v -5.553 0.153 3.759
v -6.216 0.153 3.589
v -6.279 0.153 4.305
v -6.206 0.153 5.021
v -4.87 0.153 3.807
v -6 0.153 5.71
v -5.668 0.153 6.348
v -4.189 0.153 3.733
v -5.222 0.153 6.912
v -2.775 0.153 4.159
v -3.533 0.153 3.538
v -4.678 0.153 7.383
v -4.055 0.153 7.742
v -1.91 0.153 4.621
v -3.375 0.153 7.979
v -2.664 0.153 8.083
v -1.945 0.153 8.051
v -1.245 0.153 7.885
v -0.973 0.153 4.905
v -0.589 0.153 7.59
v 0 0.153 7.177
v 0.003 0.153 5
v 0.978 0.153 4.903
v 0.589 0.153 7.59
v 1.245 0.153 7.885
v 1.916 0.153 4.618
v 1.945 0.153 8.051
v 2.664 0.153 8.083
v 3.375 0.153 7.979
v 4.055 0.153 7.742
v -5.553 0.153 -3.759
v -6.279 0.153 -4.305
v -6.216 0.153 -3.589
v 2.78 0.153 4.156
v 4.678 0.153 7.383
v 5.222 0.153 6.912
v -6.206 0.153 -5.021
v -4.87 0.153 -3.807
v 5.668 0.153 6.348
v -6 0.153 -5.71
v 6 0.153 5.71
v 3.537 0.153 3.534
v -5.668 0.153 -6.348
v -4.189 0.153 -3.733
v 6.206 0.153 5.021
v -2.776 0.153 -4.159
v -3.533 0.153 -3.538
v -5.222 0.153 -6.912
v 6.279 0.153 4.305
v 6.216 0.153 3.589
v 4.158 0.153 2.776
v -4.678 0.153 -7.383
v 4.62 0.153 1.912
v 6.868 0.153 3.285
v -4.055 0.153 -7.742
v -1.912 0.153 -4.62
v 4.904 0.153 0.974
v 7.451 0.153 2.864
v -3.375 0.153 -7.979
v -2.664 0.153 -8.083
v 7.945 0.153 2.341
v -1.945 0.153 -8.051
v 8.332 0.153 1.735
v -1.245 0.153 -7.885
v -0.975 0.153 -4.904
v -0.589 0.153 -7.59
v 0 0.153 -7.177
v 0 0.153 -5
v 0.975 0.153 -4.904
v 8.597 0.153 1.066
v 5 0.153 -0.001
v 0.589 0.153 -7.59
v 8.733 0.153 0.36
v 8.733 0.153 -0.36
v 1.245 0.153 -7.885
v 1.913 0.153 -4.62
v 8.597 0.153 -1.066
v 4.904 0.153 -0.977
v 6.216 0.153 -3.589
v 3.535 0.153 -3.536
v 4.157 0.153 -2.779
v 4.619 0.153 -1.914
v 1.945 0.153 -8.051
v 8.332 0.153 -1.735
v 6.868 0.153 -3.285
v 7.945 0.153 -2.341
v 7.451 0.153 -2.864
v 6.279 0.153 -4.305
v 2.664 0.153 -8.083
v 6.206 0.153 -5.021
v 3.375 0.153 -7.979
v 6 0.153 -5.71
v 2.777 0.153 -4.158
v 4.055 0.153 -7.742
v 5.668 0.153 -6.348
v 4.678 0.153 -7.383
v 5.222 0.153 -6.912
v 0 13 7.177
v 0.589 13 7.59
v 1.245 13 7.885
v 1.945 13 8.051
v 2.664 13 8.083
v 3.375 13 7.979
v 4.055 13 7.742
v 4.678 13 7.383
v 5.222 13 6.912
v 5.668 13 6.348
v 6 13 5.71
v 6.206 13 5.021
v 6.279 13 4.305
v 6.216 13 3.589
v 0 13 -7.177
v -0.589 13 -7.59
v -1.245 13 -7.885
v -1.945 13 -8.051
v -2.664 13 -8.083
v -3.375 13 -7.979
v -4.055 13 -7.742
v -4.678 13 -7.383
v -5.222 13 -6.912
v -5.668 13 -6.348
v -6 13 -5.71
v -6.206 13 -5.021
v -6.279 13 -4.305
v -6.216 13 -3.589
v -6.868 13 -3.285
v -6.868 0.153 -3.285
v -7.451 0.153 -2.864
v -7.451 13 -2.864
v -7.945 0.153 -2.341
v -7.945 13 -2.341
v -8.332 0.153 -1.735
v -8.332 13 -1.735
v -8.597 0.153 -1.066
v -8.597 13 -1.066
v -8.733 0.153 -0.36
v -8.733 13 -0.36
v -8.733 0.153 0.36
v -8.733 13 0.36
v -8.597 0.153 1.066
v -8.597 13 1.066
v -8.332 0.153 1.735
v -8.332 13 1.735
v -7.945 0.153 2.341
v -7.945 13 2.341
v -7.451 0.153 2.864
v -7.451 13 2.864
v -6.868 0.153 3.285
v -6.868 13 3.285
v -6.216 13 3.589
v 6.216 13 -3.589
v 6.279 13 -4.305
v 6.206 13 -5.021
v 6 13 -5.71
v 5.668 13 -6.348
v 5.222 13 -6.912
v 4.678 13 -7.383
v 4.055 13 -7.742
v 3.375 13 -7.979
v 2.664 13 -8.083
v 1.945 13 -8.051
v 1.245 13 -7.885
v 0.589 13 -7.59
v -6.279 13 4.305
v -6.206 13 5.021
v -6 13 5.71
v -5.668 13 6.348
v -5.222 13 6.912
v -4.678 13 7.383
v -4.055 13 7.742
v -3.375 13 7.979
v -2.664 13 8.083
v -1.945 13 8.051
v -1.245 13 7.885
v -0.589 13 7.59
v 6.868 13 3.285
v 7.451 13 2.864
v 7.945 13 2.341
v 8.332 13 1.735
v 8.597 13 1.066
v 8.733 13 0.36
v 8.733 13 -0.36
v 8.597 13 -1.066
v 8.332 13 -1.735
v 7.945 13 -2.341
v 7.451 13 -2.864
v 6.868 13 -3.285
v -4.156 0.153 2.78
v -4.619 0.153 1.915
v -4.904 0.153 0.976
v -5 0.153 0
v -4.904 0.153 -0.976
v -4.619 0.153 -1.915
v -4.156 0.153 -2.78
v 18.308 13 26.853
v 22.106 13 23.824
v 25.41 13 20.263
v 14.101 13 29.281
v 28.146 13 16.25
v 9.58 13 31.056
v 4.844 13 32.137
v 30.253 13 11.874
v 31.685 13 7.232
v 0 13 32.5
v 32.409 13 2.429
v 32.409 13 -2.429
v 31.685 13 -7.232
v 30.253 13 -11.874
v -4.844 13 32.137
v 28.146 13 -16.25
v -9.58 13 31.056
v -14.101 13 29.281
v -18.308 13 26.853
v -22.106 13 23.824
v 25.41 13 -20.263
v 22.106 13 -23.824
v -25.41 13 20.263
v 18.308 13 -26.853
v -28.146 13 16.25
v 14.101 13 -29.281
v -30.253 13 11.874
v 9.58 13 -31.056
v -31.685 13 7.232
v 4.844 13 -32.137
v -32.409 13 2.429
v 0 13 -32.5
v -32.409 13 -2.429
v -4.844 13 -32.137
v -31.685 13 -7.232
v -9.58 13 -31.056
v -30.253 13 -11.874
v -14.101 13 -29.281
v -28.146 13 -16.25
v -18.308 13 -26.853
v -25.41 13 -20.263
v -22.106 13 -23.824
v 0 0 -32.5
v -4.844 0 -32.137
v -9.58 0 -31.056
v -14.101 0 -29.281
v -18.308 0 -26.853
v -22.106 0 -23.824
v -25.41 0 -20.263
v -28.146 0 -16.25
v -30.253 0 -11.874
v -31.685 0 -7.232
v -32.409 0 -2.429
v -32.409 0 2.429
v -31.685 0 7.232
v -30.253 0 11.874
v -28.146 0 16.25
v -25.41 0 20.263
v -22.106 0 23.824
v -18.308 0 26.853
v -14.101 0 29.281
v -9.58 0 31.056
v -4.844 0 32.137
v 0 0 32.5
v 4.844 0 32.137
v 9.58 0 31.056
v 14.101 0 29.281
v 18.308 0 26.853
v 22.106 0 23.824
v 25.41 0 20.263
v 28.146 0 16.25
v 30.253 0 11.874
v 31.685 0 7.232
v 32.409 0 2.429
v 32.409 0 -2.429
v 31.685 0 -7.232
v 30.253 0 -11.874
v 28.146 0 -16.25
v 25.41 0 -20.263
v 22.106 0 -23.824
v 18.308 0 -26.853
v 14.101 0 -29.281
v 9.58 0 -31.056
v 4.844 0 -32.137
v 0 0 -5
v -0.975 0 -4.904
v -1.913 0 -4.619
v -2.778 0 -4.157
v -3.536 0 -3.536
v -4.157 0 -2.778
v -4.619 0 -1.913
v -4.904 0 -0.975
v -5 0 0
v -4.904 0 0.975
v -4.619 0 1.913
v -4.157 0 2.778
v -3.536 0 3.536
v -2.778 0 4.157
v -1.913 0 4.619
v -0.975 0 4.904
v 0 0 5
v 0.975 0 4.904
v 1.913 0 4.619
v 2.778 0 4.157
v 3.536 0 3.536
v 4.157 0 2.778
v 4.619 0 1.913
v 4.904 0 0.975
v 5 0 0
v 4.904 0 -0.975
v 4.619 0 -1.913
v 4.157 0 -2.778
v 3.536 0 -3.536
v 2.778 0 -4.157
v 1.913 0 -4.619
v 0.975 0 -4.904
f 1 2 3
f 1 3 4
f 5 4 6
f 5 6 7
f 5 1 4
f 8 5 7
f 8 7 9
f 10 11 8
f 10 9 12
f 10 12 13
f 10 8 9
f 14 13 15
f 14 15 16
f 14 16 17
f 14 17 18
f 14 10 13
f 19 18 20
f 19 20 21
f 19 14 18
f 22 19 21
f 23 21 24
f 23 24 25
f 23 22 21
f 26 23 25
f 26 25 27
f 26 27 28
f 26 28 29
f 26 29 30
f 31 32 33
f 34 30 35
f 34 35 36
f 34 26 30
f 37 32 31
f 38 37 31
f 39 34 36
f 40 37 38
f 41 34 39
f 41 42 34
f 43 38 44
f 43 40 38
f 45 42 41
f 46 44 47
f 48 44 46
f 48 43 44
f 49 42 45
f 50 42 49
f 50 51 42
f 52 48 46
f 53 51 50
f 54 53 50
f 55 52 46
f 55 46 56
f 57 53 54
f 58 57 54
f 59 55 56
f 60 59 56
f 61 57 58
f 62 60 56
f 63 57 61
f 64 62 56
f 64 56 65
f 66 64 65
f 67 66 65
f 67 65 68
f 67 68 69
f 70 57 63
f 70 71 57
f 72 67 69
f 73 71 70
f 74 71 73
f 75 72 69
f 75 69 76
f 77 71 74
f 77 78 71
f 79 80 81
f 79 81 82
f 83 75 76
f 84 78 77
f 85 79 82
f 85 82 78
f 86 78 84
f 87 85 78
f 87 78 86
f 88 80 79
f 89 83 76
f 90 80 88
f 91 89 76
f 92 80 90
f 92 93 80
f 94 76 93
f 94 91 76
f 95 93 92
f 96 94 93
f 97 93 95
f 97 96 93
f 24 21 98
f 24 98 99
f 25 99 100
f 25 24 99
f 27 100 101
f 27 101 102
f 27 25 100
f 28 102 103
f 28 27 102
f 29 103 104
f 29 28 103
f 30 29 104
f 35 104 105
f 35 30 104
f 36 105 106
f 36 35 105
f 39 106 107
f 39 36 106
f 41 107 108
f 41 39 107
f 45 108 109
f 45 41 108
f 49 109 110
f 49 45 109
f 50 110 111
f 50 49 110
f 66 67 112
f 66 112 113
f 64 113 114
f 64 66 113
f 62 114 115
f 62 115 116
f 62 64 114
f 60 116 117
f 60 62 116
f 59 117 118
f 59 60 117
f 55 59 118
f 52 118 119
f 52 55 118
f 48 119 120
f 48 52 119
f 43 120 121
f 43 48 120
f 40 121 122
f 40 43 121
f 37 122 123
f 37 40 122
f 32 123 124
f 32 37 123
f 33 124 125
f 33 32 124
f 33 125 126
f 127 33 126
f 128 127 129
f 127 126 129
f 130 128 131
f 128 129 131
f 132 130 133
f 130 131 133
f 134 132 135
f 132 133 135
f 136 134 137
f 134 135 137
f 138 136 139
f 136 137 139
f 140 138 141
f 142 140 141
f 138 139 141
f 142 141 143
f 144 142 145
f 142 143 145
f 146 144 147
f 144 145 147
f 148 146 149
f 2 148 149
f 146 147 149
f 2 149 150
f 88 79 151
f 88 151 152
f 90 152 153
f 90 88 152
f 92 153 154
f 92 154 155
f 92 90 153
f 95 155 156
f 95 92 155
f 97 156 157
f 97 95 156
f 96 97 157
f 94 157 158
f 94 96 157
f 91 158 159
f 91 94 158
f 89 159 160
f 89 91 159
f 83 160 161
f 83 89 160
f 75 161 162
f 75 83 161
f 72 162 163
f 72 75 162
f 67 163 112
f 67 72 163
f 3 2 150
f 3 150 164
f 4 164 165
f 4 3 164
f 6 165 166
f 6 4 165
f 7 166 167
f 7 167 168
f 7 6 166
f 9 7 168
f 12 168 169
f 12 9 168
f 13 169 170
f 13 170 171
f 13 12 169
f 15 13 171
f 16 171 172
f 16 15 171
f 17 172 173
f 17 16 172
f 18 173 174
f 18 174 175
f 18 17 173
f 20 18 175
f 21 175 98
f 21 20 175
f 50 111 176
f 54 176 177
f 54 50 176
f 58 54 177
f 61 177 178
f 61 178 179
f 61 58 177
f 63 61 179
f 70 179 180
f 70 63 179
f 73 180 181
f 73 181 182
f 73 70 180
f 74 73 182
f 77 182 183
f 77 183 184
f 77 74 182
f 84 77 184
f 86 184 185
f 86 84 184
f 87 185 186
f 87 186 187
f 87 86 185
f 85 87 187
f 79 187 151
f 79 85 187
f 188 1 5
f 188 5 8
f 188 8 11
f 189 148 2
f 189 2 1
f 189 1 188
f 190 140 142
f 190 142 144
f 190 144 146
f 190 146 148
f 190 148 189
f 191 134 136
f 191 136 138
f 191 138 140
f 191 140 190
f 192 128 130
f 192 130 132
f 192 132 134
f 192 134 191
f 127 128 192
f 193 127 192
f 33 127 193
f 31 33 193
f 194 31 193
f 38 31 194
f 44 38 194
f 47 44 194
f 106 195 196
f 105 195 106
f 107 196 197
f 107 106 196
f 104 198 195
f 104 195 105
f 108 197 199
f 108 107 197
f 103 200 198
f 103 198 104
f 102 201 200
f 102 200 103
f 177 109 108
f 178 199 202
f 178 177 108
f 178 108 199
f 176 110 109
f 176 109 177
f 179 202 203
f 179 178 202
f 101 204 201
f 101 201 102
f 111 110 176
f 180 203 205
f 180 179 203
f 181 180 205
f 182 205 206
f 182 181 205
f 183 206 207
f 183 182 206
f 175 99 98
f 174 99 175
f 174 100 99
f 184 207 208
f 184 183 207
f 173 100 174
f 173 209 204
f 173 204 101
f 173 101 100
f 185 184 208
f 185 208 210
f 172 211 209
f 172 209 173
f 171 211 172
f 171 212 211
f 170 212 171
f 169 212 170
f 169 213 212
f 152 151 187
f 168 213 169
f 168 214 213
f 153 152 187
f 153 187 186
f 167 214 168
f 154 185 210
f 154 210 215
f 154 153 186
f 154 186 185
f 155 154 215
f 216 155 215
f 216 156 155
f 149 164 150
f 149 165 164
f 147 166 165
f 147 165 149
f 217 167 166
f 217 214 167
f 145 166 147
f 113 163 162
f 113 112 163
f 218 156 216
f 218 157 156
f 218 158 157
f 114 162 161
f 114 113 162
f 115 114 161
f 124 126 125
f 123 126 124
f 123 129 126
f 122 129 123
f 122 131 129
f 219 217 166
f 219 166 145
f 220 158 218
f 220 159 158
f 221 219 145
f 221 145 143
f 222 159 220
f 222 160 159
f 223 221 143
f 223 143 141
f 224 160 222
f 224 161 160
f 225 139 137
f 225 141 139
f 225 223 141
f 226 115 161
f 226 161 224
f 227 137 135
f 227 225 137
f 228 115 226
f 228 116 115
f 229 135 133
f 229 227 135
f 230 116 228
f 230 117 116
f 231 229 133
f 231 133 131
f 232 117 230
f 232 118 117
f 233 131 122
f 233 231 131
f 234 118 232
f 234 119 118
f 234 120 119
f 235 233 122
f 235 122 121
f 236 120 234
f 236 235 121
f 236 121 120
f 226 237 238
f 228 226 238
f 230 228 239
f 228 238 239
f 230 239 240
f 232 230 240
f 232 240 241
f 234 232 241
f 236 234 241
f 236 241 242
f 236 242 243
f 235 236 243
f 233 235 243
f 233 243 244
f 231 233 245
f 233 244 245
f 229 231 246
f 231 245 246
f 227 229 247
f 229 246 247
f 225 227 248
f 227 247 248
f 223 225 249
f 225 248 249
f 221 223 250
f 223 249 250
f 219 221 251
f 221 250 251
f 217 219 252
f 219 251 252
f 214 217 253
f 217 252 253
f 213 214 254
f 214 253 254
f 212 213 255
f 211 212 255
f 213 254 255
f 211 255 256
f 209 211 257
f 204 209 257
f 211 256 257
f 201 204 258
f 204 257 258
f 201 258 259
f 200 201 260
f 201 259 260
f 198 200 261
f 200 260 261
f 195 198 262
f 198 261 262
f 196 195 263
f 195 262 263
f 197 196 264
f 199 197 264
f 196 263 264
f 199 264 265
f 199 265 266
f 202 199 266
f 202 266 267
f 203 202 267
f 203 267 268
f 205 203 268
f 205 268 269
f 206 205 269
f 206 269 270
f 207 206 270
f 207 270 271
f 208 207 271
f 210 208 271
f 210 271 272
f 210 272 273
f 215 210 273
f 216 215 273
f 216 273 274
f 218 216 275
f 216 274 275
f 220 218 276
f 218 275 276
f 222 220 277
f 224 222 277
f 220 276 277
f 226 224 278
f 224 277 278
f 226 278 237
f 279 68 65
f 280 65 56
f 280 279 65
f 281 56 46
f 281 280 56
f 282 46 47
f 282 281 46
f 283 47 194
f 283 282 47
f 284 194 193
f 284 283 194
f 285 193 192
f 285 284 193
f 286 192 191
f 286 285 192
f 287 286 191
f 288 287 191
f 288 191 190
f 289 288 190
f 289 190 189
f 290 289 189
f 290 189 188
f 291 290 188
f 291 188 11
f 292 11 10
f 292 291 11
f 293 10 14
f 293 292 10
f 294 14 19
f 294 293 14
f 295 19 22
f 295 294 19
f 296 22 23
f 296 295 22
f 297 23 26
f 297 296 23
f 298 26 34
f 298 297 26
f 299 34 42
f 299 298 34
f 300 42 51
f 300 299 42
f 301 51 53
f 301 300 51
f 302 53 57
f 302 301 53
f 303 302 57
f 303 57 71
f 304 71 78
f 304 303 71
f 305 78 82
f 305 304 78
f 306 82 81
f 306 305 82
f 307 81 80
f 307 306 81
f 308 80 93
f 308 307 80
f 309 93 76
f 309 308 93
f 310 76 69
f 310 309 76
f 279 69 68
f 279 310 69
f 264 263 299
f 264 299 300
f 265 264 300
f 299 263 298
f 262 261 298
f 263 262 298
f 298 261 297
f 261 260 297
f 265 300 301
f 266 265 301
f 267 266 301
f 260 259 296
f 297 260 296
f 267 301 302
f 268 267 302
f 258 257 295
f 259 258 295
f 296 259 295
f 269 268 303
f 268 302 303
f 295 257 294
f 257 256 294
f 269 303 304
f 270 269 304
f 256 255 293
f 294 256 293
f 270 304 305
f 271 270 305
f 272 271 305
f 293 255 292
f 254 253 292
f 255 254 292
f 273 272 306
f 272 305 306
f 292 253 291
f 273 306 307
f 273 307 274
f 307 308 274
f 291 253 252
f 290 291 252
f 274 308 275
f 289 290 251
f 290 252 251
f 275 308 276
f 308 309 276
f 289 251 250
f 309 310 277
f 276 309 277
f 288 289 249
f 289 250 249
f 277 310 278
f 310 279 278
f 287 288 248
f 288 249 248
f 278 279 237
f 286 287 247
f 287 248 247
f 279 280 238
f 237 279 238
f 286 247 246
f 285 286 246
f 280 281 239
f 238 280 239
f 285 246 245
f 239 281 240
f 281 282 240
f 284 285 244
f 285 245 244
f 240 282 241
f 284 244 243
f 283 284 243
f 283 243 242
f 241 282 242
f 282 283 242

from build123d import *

# Parameters (mm, degrees)
SKETCH1_R           = 32.5
BOSS_EXTRUDE1_DEPTH = 13
SKETCH2_R           = 5
CUT_EXTRUDE1_DEPTH  = 48.765049984
SKETCH3_R           = 3.808073824
CUT_EXTRUDE2_DEPTH  = 12.847377104
CIRPATTERN1_COUNT   = 6


with BuildPart() as part:
    # Sketch1 → Boss-Extrude1 (new body)
    with BuildSketch(Plane(origin=(0, 0, 0), x_dir=(1, 0, 0), z_dir=(0, 1, 0))):
        Circle(SKETCH1_R)
    extrude(amount=BOSS_EXTRUDE1_DEPTH)

    # Sketch2 → Cut-Extrude1 (cut, through all)
    with BuildSketch(Plane(origin=(0, 0, 0), x_dir=(1, 0, 0), z_dir=(0, 1, 0))):
        Circle(SKETCH2_R)
    extrude(amount=CUT_EXTRUDE1_DEPTH, mode=Mode.SUBTRACT)

    # Sketch3 → Cut-Extrude2 (cut)
    with BuildSketch(Plane(origin=(0, 13, 0), x_dir=(1, 0, 0), z_dir=(0, 1, 0))):
        with Locations((-4.941482649, 0)):
            Circle(SKETCH3_R)
    cut_extrude2 = extrude(amount=-CUT_EXTRUDE2_DEPTH, mode=Mode.SUBTRACT)

    # CirPattern1: Cut-Extrude2 ×6 about axis
    cirpattern1_axis = Axis((0, 0, 0), (0, 1, 0))
    for i in range(1, CIRPATTERN1_COUNT):
        add(cut_extrude2.rotate(cirpattern1_axis, i * 360 / CIRPATTERN1_COUNT), mode=Mode.SUBTRACT)


solid = part.part
